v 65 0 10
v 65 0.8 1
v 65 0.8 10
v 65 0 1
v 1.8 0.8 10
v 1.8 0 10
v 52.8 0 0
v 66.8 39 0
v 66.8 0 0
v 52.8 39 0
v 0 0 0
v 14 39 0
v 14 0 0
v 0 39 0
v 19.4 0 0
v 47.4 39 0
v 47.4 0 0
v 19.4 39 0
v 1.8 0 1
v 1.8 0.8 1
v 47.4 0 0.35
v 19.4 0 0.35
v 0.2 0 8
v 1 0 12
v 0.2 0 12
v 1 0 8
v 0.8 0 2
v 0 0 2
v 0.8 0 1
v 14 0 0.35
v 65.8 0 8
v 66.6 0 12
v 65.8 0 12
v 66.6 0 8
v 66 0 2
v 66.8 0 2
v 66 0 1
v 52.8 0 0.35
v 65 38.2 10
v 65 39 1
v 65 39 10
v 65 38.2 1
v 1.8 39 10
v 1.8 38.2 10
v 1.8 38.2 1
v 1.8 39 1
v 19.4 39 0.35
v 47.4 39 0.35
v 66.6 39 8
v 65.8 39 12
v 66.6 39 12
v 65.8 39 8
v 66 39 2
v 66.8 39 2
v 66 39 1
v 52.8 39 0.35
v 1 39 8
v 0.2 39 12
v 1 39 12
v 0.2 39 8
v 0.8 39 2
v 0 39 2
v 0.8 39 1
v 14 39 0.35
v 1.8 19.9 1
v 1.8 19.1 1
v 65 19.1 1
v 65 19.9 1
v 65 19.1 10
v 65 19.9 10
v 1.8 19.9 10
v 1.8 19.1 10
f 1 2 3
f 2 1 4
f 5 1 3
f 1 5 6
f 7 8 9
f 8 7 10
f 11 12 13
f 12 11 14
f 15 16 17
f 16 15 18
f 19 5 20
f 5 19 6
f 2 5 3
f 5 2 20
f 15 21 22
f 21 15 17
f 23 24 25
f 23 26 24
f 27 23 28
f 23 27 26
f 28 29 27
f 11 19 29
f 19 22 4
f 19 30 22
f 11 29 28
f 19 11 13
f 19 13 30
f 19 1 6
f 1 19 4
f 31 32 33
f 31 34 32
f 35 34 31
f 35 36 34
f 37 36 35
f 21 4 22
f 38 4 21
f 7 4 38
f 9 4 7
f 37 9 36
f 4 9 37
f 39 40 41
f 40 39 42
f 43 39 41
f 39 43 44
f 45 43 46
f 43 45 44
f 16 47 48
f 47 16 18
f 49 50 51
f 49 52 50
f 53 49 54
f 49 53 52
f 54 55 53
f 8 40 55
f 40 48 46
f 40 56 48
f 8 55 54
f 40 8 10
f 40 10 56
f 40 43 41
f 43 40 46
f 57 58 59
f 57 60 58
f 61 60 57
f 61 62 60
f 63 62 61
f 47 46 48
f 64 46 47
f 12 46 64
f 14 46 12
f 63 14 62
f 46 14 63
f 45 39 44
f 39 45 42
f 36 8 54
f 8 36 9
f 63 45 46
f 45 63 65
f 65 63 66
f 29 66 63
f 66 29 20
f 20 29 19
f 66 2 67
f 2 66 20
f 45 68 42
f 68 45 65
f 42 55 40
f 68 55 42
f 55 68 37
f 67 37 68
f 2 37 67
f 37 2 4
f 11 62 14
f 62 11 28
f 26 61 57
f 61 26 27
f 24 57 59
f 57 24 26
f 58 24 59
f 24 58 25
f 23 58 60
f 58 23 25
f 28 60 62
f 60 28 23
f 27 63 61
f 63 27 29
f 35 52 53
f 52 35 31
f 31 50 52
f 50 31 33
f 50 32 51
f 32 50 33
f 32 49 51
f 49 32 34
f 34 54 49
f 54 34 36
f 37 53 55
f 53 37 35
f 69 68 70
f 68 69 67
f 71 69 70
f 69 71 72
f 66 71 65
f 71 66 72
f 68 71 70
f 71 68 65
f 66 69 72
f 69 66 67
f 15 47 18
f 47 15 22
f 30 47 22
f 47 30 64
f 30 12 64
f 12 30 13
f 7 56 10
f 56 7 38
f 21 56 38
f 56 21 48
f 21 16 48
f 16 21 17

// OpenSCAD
// Radar Sensor Box: reported 64 x 18 mm cells, parallel, revised 67 mm HARD limit.
// Units: mm. Prototype: contact force, tape thickness and print fit unverified.
// OPENSCAD -D 'cells=3' -D 'part="tray"' ...
cells = 2;
part = "tray"; // tray, band, assembly, contact-fit; verification scenes below
cell_l = 64;
cell_d = 18;
length_fit_allowance = 1.0; // first print was about 1 mm tight; not a new cell measurement
outside_l = 66.8; // user approved 67 mm; retain 0.2 mm manufacturing margin
tape_t = 0.10; // provisional TOTAL copper + adhesive thickness on EACH contact
end_t = 0.8;
preload = 0.2; // inward position of each relaxed end wall at terminal height
floor_t = 1.0;
side_t = 0.8;
divider_t = 0.8;
diametral_clearance = 0.3;
end_relief = 0.8; // gap between the moving end wall and longitudinal rails
band_w = 5;
band_t = 0.8;
band_clearance = 0.2; // each side, above and below tray/cells
groove_depth = 0.35;
groove_slack = 0.4;
rib_h = 0.45;
$fn = 96;

n = part == "contact-fit" ? 1 : cells;
lane = cell_d + diametral_clearance;
pitch = lane + divider_t;
tray_w = 2*side_t + n*lane + (n-1)*divider_t;
cell_z = floor_t + cell_d/2;
packed_h = floor_t + cell_d;
fit_l = cell_l + length_fit_allowance;
cell_x = (outside_l-fit_l)/2;
// Required travel for the FIT envelope, including empirical print allowance.
// Actual contact on a nominal 64 mm cell cannot be inferred from this proxy.
travel = end_t + preload + tape_t - cell_x;
leaf_top = cell_z + 2;
land_z = cell_z - 2;
band_centres = [outside_l/4, 3*outside_l/4];
function cy(i) = side_t + lane/2 + i*pitch;

assert(n >= 1 && n <= 3 && floor(n)==n);
assert(outside_l <= 67, "Outside length exceeds the revised user limit");
assert(length_fit_allowance >= 0);
assert(cell_x >= end_t+tape_t-0.0001,
       "Fit envelope + two end walls + tape exceed the length budget; do not grow past 67");
assert(travel > 0 && travel <= preload+0.0001,
       "Contact travel must stay within the recessed leaf allowance");
assert(floor_t-groove_depth >= 0.6);
assert(end_relief >= 0.6);
assert(band_clearance < rib_h && rib_h-band_clearance < groove_depth);

echo(cells=n, tray_mm=[outside_l,tray_w,leaf_top],
     loaded_with_bands_mm=[outside_l,tray_w+2*(band_clearance+band_t),
                          packed_h+2*(band_clearance+band_t)],
     per_contact_travel_mm=travel, tape_assumption_mm=tape_t,
     reported_cell_l_mm=cell_l, fit_envelope_l_mm=fit_l,
     relaxed_taped_gap_mm=outside_l-2*(end_t+preload+tape_t));

// One continuous 0.8 mm end wall across ALL cells, rooted along the floor.
// Rails stop short so they cannot brace the moving wall. The uninterrupted
// upper land supports one copper strip per end. 'seated' is a clearance proxy,
// NOT a beam simulation; a common wall no longer gives independent cell travel.
module end_wall(right=false, seated=false) {
    inset = preload - (seated ? travel : 0);
    module left_leaf() {
        translate([0,tray_w,0]) rotate([90,0,0])
            linear_extrude(tray_w)
                polygon([[0,0],[end_t,0],[end_t,2],
                         [end_t+inset,land_z],[end_t+inset,leaf_top],
                         [inset,leaf_top],[inset,land_z],[0,2]]);
    }
    if (right) translate([outside_l,0,0]) mirror([1,0,0]) left_leaf();
    else left_leaf();
}

module tray(seated=false) {
    difference() {
        union() {
            cube([outside_l,tray_w,floor_t]);
            for (y=[0,tray_w-side_t])
                translate([end_t+preload+end_relief,y,0])
                    cube([outside_l-2*(end_t+preload+end_relief),side_t,cell_z]);
            end_wall(false,seated);
            end_wall(true,seated);
            if (n>1) for (i=[1:n-1])
                translate([end_t+preload+end_relief,
                           side_t+i*lane+(i-1)*divider_t,0])
                    cube([outside_l-2*(end_t+preload+end_relief),divider_t,cell_z]);
        }
        // The band rib engages these underside grooves without extra length.
        for (x=band_centres)
            translate([x-(band_w+groove_slack)/2,-0.01,-0.01])
                cube([band_w+groove_slack,tray_w+0.02,groove_depth+0.01]);
    }
}

module cell_envelopes(lift=0, include_fit_allowance=true) {
    length = include_fit_allowance ? fit_l : cell_l;
    for (i=[0:n-1]) translate([(outside_l-length)/2,cy(i),cell_z+lift])
        rotate([0,90,0]) cylinder(d=cell_d,h=length);
}

// A complete ring, printed flat on its broad rim, slides over the end of the
// loaded tray. A small underside rib seats in the tray groove. Print two rings.
module band_installed(x=0) {
    translate([x-band_w/2,0,0]) union() {
        difference() {
            translate([0,-band_clearance-band_t,-band_clearance-band_t])
                cube([band_w,tray_w+2*(band_clearance+band_t),
                      packed_h+2*(band_clearance+band_t)]);
            translate([-0.01,-band_clearance,-band_clearance])
                cube([band_w+0.02,tray_w+2*band_clearance,
                      packed_h+2*band_clearance]);
        }
        translate([0,2,-band_clearance-0.05])
            cube([band_w,tray_w-4,rib_h+0.05]);
    }
}

module band_print() {
    translate([packed_h+band_clearance+band_t,band_clearance+band_t,band_w/2])
        rotate([0,-90,0]) band_installed();
}

module bands(shift=0) {
    for (x=band_centres) band_installed(x+shift);
}

// Only a small central terminal patch is exposed. Routing tails must be
// insulated and run sideways; wrapping tape over the OUTSIDE ends adds length.
module contact_patches() {
    for (i=[0:n-1]) for (x=[cell_x-tape_t,cell_x+fit_l])
        translate([x,cy(i)-2,cell_z-1.5]) cube([tape_t,4,3]);
}

// Illustrative continuous copper tape, before insulating all but the terminal
// patches. Kept wholly on the inner face to preserve the hard outside length.
module copper_strips(seated=true) {
    inset = preload - (seated ? travel : 0);
    for (x=[end_t+inset,outside_l-end_t-inset-tape_t])
        translate([x,0.4,land_z+0.2]) cube([tape_t,tray_w-0.8,3.6]);
}

module preload_masks() {
    for (x=[0,outside_l-1.3])
        translate([x,-0.01,floor_t]) cube([1.3,tray_w+0.02,leaf_top]);
}

// Probe every point of each tape land for uninterrupted backing material.
module tape_land_probe() {
    for (x=[end_t+preload-0.1,outside_l-end_t-preload])
        translate([x,0.4,land_z+0.2]) cube([0.1,tray_w-0.8,3.6]);
}

// Above the shared floor, there must be a real gap between end walls and rails.
module end_relief_probe() {
    for (x=[end_t+preload+0.01,
            outside_l-end_t-preload-end_relief+0.01])
        translate([x,-0.01,floor_t+0.01])
            cube([end_relief-0.02,tray_w+0.02,leaf_top]);
}

if (part=="tray" || part=="contact-fit") tray();
else if (part=="band") band_print();
else if (part=="assembly") {
    color("SteelBlue") tray(true);
    color([0.3,0.32,0.35]) cell_envelopes();
    color("DarkOrange") contact_patches();
    color([0.12,0.5,0.6,0.8]) bands();
}
else if (part=="tape-preview") {
    color("SteelBlue") tray(true);
    color("DarkOrange") copper_strips();
}
else if (part=="tape-land-missing") difference() { tape_land_probe(); tray(); }
else if (part=="end-relief-interference") intersection() { end_relief_probe(); tray(); }
else if (part=="seated-interference") intersection() { tray(true); cell_envelopes(); }
else if (part=="nominal-cell-interference") intersection() {
    tray(); cell_envelopes(include_fit_allowance=false);
}
else if (part=="unexpected-interference") difference() {
    intersection() { tray(); cell_envelopes(); }
    preload_masks();
}
else if (part=="preload-interference") intersection() { tray(); cell_envelopes(); }
else if (part=="band-interference") intersection() {
    bands(); union() { tray(true); cell_envelopes(); }
}
else if (part=="band-retention") intersection() { bands(0.5); tray(true); }
else if (part=="cell-retention") intersection() { bands(); cell_envelopes(0.5); }
else assert(false,"Unknown part");
